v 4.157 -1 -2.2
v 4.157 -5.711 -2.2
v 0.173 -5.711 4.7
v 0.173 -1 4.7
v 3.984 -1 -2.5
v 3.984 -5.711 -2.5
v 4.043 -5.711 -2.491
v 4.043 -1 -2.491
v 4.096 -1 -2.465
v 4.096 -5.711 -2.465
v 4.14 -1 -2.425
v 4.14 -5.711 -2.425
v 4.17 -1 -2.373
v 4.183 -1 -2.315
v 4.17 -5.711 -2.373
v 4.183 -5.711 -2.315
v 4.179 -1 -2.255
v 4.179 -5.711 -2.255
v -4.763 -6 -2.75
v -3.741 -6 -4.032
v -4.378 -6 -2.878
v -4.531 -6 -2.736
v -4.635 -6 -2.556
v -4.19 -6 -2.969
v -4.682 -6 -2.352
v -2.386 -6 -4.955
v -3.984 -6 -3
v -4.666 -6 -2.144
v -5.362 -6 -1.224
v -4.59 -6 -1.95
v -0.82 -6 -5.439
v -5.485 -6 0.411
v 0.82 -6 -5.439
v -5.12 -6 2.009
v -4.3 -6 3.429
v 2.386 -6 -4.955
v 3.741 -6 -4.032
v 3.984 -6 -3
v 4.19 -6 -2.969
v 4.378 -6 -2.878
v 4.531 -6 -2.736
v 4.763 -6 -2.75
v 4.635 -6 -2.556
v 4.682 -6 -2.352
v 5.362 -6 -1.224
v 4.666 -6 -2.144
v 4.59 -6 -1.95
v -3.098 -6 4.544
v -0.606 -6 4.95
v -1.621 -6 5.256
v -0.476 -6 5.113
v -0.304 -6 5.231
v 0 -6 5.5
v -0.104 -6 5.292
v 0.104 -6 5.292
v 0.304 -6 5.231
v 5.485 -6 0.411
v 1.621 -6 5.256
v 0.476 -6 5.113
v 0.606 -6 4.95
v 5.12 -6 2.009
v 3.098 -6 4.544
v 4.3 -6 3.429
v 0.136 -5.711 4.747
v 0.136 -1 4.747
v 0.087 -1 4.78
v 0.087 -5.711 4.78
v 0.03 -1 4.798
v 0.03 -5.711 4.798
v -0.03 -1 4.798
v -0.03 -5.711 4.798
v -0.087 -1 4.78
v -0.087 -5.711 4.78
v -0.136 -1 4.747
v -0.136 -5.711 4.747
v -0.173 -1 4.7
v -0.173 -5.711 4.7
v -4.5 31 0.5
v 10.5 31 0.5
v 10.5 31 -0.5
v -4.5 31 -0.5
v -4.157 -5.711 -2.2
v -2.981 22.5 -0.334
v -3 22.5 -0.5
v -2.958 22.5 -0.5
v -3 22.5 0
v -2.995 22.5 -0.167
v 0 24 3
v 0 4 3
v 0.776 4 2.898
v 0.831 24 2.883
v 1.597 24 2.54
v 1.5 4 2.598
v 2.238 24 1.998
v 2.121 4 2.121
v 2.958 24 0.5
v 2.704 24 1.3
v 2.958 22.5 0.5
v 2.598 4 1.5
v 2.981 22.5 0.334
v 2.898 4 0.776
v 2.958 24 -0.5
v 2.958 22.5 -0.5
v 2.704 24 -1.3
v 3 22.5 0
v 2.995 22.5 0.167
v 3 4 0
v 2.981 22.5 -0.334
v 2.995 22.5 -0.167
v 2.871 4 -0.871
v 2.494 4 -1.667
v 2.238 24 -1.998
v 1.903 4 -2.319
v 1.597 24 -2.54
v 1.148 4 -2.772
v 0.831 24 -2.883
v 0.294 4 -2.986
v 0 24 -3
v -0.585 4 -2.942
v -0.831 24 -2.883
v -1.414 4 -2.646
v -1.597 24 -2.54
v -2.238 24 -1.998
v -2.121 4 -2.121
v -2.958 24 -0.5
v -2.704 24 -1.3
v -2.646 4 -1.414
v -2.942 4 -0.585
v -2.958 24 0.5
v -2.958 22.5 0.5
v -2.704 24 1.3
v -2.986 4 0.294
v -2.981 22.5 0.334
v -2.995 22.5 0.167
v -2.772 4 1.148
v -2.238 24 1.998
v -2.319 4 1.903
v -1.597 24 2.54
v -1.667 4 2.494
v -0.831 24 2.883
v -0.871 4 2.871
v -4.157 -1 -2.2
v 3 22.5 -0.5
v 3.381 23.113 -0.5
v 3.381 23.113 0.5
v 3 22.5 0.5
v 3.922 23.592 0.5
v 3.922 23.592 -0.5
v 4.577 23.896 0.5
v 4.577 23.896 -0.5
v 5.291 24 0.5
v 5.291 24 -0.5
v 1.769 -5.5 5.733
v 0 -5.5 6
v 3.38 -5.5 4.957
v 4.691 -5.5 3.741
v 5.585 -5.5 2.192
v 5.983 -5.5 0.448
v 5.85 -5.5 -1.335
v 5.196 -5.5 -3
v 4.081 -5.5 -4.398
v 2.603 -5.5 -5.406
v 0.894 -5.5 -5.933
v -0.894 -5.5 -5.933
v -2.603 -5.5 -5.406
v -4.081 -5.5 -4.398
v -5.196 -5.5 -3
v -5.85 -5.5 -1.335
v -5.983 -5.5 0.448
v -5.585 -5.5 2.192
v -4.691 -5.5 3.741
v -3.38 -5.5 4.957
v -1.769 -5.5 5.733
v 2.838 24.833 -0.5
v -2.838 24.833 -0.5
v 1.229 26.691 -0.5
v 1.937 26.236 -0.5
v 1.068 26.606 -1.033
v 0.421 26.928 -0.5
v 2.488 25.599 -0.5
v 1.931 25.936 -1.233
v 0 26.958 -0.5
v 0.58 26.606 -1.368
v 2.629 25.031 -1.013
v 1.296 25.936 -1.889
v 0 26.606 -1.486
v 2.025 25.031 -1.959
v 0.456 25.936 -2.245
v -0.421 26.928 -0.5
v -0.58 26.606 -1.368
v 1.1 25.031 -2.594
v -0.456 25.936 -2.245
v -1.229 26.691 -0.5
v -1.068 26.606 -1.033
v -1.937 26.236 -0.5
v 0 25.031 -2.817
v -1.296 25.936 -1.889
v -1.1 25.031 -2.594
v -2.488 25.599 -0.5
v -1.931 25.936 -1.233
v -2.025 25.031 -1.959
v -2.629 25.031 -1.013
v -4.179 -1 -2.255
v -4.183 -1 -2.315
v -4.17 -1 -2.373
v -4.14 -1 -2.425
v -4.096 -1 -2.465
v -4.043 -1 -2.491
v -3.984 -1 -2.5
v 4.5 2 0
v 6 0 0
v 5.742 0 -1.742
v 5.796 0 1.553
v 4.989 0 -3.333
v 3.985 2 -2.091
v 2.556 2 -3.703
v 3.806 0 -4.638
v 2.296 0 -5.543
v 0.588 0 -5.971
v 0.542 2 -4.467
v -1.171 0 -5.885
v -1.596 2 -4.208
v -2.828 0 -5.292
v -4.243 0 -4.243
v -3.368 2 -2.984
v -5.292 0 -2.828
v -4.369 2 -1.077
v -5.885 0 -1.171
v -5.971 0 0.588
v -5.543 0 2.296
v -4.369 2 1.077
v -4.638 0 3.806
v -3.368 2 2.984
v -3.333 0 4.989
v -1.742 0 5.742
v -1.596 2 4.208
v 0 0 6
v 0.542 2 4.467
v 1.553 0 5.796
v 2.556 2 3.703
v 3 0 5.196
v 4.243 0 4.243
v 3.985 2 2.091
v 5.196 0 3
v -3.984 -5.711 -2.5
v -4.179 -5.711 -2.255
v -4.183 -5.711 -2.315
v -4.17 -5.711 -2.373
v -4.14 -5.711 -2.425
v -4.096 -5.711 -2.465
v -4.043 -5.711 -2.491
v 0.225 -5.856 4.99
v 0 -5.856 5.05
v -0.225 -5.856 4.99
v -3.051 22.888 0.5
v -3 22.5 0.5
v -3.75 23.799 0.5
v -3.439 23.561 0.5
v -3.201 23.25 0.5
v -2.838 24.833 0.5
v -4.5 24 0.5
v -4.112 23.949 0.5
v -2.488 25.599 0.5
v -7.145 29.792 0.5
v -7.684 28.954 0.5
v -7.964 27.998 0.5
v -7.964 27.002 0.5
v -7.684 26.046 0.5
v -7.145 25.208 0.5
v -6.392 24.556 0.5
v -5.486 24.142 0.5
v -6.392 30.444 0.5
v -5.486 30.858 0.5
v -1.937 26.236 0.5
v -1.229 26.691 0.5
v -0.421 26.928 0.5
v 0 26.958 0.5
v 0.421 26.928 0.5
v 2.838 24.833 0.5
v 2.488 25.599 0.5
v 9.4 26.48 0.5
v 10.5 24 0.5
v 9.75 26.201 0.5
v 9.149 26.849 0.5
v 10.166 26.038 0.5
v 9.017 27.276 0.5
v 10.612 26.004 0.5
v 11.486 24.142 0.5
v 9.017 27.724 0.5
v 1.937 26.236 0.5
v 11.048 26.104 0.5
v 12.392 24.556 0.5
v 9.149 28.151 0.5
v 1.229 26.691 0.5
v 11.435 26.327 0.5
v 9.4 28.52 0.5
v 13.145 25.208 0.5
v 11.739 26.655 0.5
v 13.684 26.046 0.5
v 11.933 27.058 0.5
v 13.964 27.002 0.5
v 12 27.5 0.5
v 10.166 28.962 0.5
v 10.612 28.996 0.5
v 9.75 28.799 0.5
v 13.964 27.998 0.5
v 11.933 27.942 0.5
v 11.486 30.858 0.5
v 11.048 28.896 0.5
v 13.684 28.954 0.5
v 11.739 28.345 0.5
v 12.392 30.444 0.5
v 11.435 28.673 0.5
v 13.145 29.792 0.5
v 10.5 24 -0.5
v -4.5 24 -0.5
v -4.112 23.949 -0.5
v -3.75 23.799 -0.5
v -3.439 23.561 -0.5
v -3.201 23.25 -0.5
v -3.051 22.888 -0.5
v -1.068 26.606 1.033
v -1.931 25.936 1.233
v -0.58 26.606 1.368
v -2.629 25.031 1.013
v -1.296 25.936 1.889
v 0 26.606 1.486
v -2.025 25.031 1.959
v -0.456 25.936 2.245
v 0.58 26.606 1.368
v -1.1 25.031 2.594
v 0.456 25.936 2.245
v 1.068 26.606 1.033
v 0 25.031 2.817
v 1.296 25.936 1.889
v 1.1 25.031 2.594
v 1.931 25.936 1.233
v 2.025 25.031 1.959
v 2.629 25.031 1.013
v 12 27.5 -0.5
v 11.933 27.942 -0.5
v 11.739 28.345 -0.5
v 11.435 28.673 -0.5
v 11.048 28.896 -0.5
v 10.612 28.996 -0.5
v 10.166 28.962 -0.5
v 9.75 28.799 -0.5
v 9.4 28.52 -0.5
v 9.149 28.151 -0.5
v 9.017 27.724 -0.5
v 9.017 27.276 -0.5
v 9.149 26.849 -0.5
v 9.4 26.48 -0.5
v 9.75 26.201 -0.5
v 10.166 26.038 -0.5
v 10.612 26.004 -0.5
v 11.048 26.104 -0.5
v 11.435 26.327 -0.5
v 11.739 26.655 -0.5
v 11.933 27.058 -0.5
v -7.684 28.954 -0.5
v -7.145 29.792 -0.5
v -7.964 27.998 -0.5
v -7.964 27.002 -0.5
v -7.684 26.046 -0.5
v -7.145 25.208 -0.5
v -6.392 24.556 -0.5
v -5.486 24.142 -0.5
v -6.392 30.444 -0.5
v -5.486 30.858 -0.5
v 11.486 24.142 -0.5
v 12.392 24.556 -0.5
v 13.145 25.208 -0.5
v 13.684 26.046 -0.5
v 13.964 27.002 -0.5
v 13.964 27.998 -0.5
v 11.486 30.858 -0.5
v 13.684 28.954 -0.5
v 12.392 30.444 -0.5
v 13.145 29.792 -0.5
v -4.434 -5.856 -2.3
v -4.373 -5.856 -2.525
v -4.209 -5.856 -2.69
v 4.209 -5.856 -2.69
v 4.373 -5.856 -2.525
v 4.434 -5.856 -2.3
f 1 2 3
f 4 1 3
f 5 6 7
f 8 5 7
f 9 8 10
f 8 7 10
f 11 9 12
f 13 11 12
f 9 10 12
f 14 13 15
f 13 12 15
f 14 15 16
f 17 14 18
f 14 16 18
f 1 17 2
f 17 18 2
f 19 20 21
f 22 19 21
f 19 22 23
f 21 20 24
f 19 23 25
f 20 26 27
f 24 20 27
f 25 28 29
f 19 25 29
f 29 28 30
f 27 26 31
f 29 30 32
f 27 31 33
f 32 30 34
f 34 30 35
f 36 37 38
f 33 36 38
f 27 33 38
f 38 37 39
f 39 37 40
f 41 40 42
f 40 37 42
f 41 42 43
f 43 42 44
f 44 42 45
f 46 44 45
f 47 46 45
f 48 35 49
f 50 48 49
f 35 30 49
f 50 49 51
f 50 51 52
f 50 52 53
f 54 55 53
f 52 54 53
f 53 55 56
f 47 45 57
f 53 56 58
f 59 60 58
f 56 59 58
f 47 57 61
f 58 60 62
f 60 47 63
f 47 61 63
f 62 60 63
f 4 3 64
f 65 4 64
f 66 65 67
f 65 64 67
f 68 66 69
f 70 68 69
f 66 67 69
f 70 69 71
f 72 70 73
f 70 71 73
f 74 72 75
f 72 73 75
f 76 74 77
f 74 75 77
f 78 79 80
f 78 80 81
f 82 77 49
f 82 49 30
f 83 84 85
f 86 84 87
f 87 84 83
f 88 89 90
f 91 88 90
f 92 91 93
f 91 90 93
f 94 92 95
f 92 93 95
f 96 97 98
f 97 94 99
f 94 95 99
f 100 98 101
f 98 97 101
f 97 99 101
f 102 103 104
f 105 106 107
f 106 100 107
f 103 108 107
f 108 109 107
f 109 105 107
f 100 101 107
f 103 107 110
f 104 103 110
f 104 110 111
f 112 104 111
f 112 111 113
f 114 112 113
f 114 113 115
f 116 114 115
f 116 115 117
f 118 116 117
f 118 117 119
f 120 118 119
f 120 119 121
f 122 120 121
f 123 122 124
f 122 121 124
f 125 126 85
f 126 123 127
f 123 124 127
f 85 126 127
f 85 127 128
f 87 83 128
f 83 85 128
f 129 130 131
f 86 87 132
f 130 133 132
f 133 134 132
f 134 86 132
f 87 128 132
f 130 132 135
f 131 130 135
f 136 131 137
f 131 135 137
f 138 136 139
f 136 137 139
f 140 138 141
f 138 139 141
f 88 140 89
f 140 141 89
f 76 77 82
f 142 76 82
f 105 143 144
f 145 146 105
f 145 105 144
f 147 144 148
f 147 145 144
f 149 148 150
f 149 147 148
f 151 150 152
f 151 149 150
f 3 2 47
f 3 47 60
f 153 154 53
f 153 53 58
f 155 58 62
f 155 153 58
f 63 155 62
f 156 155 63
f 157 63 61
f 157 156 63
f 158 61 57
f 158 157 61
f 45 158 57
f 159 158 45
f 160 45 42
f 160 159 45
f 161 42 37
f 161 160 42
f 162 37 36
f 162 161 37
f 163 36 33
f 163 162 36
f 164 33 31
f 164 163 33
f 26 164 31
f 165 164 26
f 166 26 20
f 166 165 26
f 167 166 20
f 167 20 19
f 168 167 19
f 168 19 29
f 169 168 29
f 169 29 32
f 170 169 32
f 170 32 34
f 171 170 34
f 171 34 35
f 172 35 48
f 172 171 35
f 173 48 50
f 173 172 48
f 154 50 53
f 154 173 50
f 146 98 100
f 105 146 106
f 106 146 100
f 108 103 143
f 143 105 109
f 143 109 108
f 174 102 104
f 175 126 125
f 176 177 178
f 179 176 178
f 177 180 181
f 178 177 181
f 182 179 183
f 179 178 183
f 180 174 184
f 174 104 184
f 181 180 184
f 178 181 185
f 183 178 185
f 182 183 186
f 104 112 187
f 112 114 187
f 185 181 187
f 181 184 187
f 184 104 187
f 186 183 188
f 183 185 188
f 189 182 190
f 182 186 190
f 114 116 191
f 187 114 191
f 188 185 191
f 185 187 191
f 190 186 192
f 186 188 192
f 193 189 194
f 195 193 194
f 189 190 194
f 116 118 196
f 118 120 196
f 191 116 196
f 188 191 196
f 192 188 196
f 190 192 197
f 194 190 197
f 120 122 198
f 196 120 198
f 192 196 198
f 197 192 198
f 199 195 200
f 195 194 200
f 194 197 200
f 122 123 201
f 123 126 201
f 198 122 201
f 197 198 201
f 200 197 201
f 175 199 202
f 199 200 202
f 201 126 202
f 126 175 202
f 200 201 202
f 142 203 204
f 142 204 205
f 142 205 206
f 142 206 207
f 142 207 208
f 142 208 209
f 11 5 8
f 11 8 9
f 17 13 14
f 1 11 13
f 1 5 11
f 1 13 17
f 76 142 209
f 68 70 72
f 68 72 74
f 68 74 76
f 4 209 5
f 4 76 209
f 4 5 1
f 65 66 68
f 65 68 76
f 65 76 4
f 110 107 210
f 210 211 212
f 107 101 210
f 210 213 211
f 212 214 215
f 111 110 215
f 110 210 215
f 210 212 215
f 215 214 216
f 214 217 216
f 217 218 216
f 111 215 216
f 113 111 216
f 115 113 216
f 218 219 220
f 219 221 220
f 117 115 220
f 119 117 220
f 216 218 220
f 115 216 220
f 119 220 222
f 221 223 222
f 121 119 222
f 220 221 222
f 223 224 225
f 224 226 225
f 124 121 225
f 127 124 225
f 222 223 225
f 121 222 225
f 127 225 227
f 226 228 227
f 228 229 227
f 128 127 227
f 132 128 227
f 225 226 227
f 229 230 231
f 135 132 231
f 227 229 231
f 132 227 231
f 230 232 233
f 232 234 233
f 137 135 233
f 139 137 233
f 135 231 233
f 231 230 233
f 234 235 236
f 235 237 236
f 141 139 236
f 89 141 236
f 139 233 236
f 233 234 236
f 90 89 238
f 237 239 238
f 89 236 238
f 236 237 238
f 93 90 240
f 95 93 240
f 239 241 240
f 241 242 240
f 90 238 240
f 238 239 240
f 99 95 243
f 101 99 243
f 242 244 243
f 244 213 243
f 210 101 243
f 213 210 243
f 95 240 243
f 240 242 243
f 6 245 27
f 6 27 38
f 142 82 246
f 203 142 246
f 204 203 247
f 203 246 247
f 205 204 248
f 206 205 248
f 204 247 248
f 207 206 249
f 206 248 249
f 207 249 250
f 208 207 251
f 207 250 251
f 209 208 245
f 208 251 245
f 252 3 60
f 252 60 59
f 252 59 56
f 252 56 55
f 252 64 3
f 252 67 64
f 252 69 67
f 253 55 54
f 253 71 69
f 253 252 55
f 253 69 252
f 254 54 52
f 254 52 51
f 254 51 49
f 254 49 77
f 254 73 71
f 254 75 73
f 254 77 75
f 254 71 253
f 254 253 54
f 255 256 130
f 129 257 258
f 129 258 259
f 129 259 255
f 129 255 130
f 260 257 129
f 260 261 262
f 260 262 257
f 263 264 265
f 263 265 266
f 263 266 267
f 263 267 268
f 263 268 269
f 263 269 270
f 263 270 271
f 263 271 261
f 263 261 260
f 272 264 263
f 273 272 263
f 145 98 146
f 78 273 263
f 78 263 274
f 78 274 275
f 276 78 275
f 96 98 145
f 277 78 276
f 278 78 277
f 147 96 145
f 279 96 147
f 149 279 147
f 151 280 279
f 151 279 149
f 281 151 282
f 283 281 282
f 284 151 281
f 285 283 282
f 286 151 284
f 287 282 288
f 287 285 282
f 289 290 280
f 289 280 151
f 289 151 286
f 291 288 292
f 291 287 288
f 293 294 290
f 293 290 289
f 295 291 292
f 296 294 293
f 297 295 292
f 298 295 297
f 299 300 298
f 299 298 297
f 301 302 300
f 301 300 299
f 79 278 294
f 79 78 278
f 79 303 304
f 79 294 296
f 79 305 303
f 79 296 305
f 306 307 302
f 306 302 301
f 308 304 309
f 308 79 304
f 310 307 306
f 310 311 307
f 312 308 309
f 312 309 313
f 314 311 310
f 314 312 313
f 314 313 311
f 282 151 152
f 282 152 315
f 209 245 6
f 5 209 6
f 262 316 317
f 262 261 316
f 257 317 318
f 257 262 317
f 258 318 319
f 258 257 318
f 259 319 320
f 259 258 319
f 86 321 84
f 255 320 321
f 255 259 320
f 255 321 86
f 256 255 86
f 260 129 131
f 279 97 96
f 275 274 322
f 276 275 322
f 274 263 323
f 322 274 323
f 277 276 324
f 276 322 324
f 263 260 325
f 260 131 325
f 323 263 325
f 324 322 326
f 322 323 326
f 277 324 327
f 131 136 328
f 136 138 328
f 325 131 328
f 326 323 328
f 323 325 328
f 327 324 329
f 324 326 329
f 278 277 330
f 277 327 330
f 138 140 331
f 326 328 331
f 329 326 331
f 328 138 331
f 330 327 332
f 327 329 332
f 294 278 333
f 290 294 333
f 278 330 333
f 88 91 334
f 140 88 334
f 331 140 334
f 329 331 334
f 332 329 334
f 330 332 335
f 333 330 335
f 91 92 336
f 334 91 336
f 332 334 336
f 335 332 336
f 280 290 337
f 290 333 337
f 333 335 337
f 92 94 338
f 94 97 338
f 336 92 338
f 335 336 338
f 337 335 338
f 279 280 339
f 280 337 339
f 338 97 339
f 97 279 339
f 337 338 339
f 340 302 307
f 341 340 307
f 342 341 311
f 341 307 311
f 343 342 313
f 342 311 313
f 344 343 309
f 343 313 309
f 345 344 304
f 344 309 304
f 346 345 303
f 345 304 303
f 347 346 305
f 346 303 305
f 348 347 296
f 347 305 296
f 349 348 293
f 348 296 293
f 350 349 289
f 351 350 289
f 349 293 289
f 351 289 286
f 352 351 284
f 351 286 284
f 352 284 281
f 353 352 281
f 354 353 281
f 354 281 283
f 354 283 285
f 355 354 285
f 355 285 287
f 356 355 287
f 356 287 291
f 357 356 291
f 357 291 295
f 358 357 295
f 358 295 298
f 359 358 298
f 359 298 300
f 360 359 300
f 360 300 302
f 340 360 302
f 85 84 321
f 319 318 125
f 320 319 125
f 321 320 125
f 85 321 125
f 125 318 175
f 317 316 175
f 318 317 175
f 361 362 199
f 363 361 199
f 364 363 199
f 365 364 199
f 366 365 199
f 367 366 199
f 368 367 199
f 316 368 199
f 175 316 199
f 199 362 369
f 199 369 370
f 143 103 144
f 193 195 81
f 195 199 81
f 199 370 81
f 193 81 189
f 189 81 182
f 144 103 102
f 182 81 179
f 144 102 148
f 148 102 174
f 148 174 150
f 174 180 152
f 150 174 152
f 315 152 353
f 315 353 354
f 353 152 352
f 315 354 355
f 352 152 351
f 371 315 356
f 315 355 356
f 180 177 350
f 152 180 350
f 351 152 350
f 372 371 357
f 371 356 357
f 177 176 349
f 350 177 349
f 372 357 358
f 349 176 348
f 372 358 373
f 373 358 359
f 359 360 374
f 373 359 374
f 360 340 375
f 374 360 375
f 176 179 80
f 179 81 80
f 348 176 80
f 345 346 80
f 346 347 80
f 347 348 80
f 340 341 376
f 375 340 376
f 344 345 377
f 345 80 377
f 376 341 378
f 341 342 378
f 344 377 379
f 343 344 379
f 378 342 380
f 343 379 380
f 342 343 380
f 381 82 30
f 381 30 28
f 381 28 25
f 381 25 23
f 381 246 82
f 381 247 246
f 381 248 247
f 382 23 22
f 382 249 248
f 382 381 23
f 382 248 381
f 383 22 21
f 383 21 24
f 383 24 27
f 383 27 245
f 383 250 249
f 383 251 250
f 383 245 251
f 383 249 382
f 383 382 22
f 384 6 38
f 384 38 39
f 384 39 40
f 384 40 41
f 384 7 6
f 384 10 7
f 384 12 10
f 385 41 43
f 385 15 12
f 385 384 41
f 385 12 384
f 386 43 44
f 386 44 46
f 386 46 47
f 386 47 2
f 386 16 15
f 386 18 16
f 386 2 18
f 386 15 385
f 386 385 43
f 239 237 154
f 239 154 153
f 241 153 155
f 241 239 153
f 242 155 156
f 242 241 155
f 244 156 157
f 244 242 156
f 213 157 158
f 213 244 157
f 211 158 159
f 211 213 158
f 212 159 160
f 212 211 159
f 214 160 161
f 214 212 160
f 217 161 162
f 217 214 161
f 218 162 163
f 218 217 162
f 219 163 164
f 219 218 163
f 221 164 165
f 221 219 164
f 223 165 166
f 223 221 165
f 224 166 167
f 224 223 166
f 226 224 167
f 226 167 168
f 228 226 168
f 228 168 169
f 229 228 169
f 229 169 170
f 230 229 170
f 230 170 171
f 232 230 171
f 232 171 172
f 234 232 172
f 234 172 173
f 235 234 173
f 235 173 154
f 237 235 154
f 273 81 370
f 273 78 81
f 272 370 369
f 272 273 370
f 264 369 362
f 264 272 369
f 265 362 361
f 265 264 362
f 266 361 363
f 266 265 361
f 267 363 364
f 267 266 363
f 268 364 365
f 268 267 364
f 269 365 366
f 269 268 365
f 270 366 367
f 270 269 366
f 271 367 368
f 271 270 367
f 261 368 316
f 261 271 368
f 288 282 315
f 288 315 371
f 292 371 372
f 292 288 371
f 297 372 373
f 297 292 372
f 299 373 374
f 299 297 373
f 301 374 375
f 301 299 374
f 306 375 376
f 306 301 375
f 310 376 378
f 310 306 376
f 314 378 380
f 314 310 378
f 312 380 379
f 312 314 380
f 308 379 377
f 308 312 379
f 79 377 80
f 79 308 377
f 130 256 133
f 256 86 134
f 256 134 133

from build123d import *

# Parameters (mm, degrees)
SKETCH_1_R          = 6
EXTRUDE_1_DEPTH     = 6
SKETCH_2_R          = 3
SKETCH_1_2_R        = 6
SKETCH_2_2_R        = 3
EXTRUDE_2_DEPTH     = 20
EXTRUDE_4_DEPTH     = 0.5
SKETCH_8_R          = 1.5
CUT_EXTRUDE_1_DEPTH = 35.630189161
CUT_EXTRUDE_2_DEPTH = 5
CHAMFER_1_SIZE      = 0.5
CHAMFER_1_SIZE2     = 0.288675135
CHAMFER_2_SIZE      = 0.5


with BuildPart() as part:
    # 草图1 → 凸台-拉伸1 (new body)
    with BuildSketch(Plane(origin=(0, 0, 0), x_dir=(1, 0, 0), z_dir=(0, 1, 0))):
        with Locations(Location((0, 0, 0), (0, 0, 270))):
            Circle(SKETCH_1_R)
    extrude(amount=-EXTRUDE_1_DEPTH)

    # 草图2 → 放样1 section 0
    with BuildSketch(Plane(origin=(0, 4, 0), x_dir=(1, 0, 0), z_dir=(0, 1, 0))):
        Circle(SKETCH_2_R)
    # 草图1<2> → 放样1 section 1
    with BuildSketch(Plane(origin=(0, 0, 0), x_dir=(1, 0, 0), z_dir=(0, 1, 0))):
        Circle(SKETCH_1_2_R)
    loft()

    # 草图2<2> → 凸台-拉伸2 (add)
    with BuildSketch(Plane(origin=(0, 4, 0), x_dir=(1, 0, 0), z_dir=(0, 1, 0))):
        with Locations(Location((0, 0, 0), (0, 0, 270))):
            Circle(SKETCH_2_2_R)
    extrude(amount=EXTRUDE_2_DEPTH)

    # 草图7 → 旋转2 (revolve)
    with BuildSketch(Plane.XY, mode=Mode.PRIVATE) as revolve_2_sk:
        with BuildLine():
            Line((-3, 24), (0, 24))
            Line((0, 24), (0, 27))
            ThreePointArc((0, 27), (-2.121320344, 26.121320344), (-3, 24))
        make_face()
    revolve(revolve_2_sk.sketch.rotate(Axis((0, 0, 0), (0, 1, 0)), 90), axis=Axis((0, 0, 0), (0, 1, 0)))

    # 草图5 → 凸台-拉伸4 (add, symmetric)
    with BuildSketch(Plane.XY):
        with BuildLine():
            Line((-3, 22.5), (3, 22.5))
            ThreePointArc((3, 22.5), (3.921981454, 23.591650066), (5.291287847, 24))
            Line((5.291287847, 24), (10.5, 24))
            ThreePointArc((10.5, 24), (14, 27.5), (10.5, 31))
            Line((10.5, 31), (-4.5, 31))
            ThreePointArc((-4.5, 31), (-8, 27.5), (-4.5, 24))
            ThreePointArc((-4.5, 24), (-3.439339828, 23.560660172), (-3, 22.5))
        make_face()
    extrude(amount=EXTRUDE_4_DEPTH, both=True)

    # 草图8 → 切除-拉伸1 (cut, through all)
    with BuildSketch(Plane.XY.offset(0.5)):
        with Locations((10.5, 27.5)):
            Circle(SKETCH_8_R)
    extrude(amount=-CUT_EXTRUDE_1_DEPTH, mode=Mode.SUBTRACT)

    # 草图9 → 切除-拉伸2 (cut)
    with BuildSketch(Plane.XZ.offset(6)):
        with BuildLine():
            Line((-0.173205081, 4.7), (-4.156921938, -2.2))
            ThreePointArc((-4.156921938, -2.2), (-4.156921938, -2.4), (-3.983716857, -2.5))
            Line((-3.983716857, -2.5), (3.983716857, -2.5))
            ThreePointArc((3.983716857, -2.5), (4.156921938, -2.4), (4.156921938, -2.2))
            Line((4.156921938, -2.2), (0.173205081, 4.7))
            ThreePointArc((0.173205081, 4.7), (0, 4.8), (-0.173205081, 4.7))
        make_face()
    extrude(amount=-CUT_EXTRUDE_2_DEPTH, mode=Mode.SUBTRACT)

    # 倒角1
    chamfer_1_edges = [part.edges().sort_by_distance(p)[0] for p in [
        (4.156921938, -6, -2.4),
        (2.165063509, -6, 1.25),
        (0, -6, 4.8),
        (-2.165063509, -6, 1.25),
        (-4.156921938, -6, -2.4),
        (0, -6, -2.5),
    ]]
    chamfer_1_side = [part.faces().sort_by_distance(p)[0] for p in [
        (0, -6, -5.830294373),
    ]]
    chamfer(chamfer_1_edges, length=CHAMFER_1_SIZE, length2=CHAMFER_1_SIZE2, reference=chamfer_1_side[0])

    # 倒角2
    chamfer_2_edges = [part.edges().sort_by_distance(p)[0] for p in [
        (0, -6, -6),
    ]]
    chamfer(chamfer_2_edges, length=CHAMFER_2_SIZE)


solid = part.part
